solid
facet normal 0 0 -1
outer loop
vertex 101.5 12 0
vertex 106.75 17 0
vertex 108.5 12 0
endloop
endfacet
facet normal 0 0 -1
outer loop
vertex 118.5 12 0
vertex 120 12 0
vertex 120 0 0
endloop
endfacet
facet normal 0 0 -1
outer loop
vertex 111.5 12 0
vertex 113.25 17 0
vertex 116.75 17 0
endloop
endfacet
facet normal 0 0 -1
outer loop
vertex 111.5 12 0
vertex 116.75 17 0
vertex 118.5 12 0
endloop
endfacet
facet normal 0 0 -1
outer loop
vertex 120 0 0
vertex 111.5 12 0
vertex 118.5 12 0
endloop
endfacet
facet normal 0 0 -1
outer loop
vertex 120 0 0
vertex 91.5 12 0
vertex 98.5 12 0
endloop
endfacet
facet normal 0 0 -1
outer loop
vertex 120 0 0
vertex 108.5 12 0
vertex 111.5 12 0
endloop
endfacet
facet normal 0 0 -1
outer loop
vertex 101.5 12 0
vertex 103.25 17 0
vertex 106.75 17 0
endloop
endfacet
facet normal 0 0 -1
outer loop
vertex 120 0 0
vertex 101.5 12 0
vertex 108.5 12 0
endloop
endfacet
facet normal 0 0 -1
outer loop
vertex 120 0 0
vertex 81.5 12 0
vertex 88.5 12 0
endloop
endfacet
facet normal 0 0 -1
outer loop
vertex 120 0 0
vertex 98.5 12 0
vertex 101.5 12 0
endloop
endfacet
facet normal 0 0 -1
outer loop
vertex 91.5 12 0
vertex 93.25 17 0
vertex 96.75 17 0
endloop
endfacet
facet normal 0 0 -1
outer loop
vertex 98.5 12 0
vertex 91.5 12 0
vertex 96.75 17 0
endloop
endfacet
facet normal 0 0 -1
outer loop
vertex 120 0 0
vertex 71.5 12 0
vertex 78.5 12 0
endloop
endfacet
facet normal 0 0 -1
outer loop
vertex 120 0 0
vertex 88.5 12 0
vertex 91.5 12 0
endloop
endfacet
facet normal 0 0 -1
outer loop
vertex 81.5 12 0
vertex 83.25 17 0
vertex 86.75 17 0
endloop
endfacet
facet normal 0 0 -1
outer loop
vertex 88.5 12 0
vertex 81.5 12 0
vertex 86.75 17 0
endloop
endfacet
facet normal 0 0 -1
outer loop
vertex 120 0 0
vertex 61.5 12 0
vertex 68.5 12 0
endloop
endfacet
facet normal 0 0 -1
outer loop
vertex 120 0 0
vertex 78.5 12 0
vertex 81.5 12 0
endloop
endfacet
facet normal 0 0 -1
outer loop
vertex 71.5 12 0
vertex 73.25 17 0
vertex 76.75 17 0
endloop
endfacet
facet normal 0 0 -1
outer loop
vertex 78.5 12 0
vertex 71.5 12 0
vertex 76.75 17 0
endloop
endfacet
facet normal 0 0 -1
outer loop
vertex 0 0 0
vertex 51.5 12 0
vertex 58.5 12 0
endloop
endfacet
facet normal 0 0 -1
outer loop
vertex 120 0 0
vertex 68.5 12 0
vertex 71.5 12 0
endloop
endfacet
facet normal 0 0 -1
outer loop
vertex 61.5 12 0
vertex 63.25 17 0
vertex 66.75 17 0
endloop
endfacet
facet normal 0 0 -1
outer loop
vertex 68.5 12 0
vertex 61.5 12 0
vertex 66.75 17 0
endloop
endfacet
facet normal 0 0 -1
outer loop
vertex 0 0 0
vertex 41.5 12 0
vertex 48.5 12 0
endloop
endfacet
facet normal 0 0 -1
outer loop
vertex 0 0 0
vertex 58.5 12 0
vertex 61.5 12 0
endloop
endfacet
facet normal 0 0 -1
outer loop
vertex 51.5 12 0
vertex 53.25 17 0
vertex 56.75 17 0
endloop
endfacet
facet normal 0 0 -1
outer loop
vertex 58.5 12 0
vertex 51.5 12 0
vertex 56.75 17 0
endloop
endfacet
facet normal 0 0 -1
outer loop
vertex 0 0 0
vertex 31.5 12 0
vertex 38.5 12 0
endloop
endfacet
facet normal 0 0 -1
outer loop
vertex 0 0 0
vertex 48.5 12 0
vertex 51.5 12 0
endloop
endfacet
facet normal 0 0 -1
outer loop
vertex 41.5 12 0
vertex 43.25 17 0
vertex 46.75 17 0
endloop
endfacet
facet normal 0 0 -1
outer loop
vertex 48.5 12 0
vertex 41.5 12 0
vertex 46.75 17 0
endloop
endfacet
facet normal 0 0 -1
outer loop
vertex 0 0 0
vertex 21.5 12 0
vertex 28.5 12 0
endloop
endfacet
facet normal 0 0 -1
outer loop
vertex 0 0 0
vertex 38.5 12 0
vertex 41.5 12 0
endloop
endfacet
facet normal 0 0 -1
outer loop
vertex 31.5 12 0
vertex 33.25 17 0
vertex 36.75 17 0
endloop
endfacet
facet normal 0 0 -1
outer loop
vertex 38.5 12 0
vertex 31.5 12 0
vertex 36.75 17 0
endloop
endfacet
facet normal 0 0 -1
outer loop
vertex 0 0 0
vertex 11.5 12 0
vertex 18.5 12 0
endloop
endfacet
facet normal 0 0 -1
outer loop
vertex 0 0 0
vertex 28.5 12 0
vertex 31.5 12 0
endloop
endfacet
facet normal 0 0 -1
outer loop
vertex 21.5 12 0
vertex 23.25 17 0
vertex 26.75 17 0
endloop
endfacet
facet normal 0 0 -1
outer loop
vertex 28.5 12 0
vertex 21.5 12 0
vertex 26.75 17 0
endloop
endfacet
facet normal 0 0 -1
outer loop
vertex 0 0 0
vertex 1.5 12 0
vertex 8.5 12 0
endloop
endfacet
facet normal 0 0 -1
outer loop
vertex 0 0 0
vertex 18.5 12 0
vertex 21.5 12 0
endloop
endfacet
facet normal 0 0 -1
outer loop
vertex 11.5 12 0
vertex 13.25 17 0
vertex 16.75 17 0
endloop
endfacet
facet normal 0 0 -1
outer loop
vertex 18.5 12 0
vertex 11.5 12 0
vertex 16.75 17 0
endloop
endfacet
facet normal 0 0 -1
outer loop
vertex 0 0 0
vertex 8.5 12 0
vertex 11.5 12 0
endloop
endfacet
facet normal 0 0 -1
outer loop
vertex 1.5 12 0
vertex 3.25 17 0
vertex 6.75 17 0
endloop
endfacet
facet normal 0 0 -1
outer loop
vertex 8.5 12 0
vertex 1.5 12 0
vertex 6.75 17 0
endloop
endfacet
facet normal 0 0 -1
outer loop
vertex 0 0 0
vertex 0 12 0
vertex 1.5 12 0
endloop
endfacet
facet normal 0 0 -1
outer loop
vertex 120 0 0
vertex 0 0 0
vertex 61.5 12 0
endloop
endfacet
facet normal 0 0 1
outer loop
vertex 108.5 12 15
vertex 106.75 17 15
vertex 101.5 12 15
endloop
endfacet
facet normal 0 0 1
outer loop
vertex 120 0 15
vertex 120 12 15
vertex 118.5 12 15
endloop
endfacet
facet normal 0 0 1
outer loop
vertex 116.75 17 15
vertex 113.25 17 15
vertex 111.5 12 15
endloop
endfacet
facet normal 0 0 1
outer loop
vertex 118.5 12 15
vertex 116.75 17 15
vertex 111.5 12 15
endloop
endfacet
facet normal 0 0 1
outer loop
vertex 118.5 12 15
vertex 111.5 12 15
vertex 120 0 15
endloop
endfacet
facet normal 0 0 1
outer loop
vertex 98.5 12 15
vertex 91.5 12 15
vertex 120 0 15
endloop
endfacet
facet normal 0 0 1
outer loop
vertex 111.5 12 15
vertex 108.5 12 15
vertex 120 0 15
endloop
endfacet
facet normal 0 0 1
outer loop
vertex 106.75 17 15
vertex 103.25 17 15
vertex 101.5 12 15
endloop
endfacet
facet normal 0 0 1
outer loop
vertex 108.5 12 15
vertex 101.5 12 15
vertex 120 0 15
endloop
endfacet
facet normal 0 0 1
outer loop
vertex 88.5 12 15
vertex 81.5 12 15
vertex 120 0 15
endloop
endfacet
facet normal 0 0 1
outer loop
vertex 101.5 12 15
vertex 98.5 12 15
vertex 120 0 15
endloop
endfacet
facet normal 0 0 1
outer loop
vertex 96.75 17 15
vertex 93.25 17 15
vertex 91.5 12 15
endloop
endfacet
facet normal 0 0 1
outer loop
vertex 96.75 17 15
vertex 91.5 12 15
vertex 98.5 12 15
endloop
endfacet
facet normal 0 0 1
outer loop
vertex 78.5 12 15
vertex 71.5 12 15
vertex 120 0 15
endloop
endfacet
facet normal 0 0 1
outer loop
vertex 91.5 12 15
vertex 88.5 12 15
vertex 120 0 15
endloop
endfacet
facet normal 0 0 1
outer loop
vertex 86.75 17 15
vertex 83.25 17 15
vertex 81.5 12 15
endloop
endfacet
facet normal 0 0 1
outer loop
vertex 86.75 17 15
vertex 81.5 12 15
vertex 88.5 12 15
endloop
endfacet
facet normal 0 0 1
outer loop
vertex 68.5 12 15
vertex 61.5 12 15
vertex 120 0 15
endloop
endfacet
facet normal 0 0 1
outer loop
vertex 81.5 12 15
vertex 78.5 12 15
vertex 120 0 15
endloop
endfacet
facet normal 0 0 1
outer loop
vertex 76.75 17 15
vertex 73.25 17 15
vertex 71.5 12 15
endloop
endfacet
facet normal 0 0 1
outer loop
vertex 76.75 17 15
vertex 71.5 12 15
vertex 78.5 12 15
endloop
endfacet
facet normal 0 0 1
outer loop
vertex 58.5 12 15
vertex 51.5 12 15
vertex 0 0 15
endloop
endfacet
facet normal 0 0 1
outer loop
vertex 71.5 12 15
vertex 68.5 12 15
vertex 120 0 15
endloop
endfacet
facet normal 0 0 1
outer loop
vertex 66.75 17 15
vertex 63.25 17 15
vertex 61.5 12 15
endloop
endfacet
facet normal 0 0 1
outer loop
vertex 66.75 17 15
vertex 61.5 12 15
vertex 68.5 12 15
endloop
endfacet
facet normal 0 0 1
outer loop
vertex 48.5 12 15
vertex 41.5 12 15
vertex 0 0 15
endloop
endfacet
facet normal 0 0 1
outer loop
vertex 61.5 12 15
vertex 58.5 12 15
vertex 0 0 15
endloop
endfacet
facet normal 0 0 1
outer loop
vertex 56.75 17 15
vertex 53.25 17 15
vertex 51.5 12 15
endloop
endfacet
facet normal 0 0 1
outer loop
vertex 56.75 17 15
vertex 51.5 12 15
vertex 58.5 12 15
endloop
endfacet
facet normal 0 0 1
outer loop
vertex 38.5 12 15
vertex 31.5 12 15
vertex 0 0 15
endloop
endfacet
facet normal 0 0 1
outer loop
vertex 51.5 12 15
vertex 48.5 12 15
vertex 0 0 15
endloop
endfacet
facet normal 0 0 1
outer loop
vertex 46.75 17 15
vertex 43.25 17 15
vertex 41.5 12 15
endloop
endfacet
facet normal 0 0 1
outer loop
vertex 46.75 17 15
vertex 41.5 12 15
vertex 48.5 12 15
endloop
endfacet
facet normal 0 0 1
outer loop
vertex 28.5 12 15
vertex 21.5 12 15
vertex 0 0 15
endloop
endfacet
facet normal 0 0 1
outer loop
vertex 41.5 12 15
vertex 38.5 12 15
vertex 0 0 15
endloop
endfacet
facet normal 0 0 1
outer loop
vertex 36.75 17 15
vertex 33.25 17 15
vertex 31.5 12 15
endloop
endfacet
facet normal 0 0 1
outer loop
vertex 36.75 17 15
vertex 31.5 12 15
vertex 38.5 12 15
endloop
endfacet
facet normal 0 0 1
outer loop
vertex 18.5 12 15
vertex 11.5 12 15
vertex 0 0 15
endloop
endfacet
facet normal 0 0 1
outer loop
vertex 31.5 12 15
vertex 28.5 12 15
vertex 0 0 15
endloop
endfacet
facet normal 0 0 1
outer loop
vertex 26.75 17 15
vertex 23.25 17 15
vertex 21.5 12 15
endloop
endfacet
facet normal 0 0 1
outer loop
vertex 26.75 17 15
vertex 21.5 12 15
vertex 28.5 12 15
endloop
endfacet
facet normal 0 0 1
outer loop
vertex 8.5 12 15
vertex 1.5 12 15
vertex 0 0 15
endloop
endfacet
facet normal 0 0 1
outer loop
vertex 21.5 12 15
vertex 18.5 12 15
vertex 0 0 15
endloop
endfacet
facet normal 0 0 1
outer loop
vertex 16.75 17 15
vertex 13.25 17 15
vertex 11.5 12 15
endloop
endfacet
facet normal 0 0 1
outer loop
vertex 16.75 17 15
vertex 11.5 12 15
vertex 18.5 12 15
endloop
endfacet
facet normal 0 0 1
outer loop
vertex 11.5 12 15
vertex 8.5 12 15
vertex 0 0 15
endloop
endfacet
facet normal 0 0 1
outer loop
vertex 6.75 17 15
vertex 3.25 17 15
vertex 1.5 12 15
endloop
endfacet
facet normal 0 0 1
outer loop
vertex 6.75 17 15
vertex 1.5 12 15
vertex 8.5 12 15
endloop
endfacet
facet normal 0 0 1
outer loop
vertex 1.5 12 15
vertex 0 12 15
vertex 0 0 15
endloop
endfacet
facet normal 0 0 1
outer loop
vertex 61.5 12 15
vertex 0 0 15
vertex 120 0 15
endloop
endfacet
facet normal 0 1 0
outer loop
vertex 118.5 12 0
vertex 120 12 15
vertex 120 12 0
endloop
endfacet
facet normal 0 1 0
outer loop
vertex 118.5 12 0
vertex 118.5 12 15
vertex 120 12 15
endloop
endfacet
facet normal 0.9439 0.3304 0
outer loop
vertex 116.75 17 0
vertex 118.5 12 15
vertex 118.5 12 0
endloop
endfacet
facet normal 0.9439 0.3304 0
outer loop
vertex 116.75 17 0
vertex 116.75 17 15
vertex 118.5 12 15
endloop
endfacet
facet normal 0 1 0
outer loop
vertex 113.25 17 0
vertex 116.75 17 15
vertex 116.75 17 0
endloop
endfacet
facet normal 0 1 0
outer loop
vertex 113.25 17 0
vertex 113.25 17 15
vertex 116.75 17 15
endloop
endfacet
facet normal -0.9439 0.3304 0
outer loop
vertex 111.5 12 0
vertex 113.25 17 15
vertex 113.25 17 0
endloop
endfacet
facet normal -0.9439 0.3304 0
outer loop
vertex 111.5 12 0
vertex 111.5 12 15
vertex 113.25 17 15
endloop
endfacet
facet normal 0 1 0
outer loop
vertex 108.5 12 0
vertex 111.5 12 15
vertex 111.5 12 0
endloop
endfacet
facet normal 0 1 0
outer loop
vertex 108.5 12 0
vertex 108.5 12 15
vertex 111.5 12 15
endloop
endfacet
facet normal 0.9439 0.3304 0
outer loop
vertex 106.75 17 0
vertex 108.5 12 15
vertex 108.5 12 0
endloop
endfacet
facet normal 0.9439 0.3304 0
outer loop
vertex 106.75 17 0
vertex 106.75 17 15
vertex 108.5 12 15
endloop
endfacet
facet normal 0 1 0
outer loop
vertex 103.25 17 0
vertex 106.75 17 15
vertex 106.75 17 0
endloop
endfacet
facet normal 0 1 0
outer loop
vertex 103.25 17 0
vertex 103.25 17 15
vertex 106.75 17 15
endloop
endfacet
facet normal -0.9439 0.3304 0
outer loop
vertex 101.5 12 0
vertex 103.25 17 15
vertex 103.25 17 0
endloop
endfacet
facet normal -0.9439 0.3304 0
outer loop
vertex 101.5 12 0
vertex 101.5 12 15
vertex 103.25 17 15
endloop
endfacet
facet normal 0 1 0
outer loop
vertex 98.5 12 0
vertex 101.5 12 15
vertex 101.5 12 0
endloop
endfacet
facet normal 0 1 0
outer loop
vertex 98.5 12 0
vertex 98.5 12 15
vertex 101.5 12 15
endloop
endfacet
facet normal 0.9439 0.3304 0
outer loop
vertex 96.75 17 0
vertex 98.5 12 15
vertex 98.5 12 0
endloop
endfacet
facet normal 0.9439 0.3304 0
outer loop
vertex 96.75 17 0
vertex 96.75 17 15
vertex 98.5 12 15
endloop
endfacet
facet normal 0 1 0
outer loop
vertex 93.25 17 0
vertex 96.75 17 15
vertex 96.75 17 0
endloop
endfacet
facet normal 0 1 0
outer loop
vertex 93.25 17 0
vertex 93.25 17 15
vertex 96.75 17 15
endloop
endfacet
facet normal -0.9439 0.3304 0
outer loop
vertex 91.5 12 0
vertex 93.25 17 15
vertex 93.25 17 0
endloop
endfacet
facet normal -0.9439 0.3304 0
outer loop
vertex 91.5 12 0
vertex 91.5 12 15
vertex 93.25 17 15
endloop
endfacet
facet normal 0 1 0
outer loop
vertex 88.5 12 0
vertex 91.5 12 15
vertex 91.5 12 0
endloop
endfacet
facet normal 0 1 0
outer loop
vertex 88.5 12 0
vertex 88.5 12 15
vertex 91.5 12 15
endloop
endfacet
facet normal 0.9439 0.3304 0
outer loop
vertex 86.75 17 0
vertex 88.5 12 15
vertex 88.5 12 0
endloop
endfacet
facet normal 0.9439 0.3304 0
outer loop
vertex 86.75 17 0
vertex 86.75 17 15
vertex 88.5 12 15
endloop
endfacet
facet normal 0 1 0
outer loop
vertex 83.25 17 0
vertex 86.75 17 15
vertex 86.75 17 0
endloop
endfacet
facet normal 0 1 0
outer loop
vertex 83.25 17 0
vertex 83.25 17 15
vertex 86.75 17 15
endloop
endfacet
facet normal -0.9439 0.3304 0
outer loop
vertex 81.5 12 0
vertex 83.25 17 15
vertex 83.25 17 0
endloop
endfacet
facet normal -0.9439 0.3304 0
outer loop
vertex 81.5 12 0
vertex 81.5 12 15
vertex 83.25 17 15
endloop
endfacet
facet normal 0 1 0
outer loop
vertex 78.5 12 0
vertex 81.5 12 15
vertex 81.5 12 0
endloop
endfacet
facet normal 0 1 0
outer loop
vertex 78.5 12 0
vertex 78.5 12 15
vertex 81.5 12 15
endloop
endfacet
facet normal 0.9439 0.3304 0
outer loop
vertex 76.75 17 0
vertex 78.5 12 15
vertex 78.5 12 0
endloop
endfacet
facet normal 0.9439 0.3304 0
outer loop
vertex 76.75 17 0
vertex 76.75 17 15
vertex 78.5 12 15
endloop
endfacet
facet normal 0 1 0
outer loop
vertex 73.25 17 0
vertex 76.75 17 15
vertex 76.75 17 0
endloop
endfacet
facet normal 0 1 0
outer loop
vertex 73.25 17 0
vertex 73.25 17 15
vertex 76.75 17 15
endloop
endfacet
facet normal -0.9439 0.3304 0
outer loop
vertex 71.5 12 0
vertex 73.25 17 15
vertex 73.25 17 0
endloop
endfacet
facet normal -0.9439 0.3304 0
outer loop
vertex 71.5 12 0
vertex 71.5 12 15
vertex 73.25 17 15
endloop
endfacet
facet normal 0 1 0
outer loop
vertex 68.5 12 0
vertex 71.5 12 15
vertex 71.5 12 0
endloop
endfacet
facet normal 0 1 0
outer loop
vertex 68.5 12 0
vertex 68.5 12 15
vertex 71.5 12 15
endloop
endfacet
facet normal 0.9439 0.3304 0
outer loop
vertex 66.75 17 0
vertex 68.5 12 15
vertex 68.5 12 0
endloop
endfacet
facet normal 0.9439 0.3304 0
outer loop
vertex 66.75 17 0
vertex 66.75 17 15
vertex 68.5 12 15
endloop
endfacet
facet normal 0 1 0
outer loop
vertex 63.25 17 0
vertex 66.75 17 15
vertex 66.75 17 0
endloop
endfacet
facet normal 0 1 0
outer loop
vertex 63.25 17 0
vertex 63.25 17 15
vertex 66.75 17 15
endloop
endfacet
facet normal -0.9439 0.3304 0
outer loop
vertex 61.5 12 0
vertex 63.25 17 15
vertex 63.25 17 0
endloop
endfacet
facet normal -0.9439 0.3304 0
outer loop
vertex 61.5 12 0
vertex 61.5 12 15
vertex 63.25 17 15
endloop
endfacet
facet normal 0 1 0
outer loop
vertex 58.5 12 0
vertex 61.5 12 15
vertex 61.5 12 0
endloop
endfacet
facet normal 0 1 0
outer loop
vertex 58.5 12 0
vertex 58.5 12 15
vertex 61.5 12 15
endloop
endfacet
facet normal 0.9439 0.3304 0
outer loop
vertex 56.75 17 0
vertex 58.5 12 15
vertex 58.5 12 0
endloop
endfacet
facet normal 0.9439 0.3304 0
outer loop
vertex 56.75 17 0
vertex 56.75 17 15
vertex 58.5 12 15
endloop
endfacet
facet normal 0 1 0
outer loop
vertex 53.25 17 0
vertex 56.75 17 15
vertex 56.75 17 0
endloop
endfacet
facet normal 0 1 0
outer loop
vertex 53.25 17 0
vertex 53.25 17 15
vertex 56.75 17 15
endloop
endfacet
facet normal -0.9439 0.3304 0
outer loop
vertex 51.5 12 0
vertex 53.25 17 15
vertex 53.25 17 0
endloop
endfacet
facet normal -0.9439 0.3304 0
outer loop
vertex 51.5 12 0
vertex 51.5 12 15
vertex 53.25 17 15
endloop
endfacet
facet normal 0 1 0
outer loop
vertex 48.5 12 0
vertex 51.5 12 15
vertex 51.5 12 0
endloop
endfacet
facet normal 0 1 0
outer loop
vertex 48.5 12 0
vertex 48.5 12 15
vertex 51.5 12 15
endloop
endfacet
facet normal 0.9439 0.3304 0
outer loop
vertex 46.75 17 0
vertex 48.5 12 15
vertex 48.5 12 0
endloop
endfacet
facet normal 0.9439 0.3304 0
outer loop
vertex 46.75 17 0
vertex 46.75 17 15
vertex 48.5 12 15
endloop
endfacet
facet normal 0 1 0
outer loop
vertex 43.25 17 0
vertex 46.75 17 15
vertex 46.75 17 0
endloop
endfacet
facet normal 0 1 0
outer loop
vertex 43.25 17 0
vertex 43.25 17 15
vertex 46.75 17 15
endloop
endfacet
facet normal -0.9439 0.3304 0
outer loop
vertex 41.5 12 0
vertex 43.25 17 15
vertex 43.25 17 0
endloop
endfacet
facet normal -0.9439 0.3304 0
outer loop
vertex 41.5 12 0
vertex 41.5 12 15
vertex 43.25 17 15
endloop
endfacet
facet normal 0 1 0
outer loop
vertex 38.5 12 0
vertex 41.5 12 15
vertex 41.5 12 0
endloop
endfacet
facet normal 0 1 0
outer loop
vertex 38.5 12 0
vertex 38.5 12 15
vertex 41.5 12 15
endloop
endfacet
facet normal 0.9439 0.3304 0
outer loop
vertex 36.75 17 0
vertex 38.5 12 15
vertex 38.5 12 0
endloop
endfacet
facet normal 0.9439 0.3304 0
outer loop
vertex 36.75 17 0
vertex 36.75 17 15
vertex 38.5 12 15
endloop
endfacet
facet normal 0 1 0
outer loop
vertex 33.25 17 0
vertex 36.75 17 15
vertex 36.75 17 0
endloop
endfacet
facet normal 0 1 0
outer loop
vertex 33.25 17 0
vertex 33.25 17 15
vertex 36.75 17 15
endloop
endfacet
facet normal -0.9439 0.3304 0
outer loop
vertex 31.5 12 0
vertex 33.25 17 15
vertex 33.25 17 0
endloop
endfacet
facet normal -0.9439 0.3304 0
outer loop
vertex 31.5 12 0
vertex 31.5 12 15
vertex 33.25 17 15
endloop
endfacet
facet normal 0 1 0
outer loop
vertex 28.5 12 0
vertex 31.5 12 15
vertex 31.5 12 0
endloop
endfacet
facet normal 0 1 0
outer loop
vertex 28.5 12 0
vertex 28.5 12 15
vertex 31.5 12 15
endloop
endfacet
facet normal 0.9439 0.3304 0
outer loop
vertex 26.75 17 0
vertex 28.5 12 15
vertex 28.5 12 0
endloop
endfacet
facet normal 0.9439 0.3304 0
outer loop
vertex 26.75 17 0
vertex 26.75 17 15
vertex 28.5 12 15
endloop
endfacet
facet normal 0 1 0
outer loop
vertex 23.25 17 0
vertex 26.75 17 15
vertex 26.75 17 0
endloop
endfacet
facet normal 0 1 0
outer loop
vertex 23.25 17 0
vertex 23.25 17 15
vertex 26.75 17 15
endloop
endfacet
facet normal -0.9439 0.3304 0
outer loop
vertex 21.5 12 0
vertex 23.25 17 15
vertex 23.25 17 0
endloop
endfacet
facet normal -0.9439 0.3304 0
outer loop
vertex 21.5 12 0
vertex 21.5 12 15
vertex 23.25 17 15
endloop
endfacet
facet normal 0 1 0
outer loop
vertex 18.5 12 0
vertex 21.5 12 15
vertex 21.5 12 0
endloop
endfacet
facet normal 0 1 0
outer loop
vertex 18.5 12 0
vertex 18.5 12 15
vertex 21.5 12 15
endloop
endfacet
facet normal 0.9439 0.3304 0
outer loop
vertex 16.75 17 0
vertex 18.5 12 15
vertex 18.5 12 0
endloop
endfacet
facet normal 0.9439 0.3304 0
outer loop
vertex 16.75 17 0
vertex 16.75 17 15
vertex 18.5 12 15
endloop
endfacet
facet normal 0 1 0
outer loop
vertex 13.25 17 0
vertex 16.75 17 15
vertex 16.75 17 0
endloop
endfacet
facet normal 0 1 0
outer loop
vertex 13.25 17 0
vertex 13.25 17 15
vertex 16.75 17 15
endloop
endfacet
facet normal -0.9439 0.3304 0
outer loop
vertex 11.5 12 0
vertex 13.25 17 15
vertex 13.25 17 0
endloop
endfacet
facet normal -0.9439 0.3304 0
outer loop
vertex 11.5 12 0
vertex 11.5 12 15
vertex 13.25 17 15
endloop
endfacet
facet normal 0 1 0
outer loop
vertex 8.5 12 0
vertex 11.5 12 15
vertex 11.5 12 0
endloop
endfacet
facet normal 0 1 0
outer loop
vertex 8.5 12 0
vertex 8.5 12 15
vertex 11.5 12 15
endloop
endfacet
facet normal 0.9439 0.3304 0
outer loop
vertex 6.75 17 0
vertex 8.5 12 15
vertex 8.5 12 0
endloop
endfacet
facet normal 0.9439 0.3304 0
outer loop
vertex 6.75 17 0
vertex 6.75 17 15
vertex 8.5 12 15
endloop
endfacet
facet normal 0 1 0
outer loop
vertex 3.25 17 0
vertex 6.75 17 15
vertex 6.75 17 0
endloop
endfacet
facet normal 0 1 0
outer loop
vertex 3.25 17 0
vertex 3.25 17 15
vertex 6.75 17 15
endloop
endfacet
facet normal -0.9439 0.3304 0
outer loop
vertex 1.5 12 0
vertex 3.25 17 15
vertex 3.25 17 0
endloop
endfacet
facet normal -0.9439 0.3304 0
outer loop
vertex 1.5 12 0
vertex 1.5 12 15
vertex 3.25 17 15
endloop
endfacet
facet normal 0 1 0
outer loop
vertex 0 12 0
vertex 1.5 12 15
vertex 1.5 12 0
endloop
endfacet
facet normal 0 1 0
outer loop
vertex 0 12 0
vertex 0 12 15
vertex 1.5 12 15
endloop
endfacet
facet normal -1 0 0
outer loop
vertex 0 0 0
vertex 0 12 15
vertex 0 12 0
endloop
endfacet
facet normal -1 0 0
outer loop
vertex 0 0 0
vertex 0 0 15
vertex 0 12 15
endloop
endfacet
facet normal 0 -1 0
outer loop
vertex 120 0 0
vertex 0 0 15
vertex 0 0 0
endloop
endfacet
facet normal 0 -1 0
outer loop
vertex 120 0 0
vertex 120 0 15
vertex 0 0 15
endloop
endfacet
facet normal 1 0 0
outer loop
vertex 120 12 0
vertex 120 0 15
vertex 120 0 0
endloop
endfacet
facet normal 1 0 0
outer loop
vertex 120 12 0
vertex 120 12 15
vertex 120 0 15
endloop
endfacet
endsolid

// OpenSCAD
$fn = 32;

// ----------------------------------------------------------------------
// Gear rack: 12 teeth, pitch 10 mm
// ----------------------------------------------------------------------

// --- parameters (mm) ---
teeth = 12;               // number of teeth
pitch = 10;               // tooth pitch, X
root_w = 7;               // tooth width at the root
tip_w = 3.5;              // tooth width at the tip
base_h = 12;              // rack body height, Y
tooth_h = 5;              // tooth height above the body
plate_t = 15;             // rack width, Z (extrusion height)

rack_l = teeth * pitch;  // overall length
total_h = base_h + tooth_h;  // overall height

profile = [[0, 0], [120, 0], [120, 12], [118.5, 12], [116.75, 17], [113.25, 17], [111.5, 12], [108.5, 12], [106.75, 17], [103.25, 17], [101.5, 12], [98.5, 12], [96.75, 17], [93.25, 17], [91.5, 12], [88.5, 12], [86.75, 17], [83.25, 17], [81.5, 12], [78.5, 12], [76.75, 17], [73.25, 17], [71.5, 12], [68.5, 12], [66.75, 17], [63.25, 17], [61.5, 12], [58.5, 12], [56.75, 17], [53.25, 17], [51.5, 12], [48.5, 12], [46.75, 17], [43.25, 17], [41.5, 12], [38.5, 12], [36.75, 17], [33.25, 17], [31.5, 12], [28.5, 12], [26.75, 17], [23.25, 17], [21.5, 12], [18.5, 12], [16.75, 17], [13.25, 17], [11.5, 12], [8.5, 12], [6.75, 17], [3.25, 17], [1.5, 12], [0, 12]];  // primary outline, 52 points, counter clockwise

// --- the one profile operation ---
linear_extrude(height = plate_t) polygon(points = profile);
